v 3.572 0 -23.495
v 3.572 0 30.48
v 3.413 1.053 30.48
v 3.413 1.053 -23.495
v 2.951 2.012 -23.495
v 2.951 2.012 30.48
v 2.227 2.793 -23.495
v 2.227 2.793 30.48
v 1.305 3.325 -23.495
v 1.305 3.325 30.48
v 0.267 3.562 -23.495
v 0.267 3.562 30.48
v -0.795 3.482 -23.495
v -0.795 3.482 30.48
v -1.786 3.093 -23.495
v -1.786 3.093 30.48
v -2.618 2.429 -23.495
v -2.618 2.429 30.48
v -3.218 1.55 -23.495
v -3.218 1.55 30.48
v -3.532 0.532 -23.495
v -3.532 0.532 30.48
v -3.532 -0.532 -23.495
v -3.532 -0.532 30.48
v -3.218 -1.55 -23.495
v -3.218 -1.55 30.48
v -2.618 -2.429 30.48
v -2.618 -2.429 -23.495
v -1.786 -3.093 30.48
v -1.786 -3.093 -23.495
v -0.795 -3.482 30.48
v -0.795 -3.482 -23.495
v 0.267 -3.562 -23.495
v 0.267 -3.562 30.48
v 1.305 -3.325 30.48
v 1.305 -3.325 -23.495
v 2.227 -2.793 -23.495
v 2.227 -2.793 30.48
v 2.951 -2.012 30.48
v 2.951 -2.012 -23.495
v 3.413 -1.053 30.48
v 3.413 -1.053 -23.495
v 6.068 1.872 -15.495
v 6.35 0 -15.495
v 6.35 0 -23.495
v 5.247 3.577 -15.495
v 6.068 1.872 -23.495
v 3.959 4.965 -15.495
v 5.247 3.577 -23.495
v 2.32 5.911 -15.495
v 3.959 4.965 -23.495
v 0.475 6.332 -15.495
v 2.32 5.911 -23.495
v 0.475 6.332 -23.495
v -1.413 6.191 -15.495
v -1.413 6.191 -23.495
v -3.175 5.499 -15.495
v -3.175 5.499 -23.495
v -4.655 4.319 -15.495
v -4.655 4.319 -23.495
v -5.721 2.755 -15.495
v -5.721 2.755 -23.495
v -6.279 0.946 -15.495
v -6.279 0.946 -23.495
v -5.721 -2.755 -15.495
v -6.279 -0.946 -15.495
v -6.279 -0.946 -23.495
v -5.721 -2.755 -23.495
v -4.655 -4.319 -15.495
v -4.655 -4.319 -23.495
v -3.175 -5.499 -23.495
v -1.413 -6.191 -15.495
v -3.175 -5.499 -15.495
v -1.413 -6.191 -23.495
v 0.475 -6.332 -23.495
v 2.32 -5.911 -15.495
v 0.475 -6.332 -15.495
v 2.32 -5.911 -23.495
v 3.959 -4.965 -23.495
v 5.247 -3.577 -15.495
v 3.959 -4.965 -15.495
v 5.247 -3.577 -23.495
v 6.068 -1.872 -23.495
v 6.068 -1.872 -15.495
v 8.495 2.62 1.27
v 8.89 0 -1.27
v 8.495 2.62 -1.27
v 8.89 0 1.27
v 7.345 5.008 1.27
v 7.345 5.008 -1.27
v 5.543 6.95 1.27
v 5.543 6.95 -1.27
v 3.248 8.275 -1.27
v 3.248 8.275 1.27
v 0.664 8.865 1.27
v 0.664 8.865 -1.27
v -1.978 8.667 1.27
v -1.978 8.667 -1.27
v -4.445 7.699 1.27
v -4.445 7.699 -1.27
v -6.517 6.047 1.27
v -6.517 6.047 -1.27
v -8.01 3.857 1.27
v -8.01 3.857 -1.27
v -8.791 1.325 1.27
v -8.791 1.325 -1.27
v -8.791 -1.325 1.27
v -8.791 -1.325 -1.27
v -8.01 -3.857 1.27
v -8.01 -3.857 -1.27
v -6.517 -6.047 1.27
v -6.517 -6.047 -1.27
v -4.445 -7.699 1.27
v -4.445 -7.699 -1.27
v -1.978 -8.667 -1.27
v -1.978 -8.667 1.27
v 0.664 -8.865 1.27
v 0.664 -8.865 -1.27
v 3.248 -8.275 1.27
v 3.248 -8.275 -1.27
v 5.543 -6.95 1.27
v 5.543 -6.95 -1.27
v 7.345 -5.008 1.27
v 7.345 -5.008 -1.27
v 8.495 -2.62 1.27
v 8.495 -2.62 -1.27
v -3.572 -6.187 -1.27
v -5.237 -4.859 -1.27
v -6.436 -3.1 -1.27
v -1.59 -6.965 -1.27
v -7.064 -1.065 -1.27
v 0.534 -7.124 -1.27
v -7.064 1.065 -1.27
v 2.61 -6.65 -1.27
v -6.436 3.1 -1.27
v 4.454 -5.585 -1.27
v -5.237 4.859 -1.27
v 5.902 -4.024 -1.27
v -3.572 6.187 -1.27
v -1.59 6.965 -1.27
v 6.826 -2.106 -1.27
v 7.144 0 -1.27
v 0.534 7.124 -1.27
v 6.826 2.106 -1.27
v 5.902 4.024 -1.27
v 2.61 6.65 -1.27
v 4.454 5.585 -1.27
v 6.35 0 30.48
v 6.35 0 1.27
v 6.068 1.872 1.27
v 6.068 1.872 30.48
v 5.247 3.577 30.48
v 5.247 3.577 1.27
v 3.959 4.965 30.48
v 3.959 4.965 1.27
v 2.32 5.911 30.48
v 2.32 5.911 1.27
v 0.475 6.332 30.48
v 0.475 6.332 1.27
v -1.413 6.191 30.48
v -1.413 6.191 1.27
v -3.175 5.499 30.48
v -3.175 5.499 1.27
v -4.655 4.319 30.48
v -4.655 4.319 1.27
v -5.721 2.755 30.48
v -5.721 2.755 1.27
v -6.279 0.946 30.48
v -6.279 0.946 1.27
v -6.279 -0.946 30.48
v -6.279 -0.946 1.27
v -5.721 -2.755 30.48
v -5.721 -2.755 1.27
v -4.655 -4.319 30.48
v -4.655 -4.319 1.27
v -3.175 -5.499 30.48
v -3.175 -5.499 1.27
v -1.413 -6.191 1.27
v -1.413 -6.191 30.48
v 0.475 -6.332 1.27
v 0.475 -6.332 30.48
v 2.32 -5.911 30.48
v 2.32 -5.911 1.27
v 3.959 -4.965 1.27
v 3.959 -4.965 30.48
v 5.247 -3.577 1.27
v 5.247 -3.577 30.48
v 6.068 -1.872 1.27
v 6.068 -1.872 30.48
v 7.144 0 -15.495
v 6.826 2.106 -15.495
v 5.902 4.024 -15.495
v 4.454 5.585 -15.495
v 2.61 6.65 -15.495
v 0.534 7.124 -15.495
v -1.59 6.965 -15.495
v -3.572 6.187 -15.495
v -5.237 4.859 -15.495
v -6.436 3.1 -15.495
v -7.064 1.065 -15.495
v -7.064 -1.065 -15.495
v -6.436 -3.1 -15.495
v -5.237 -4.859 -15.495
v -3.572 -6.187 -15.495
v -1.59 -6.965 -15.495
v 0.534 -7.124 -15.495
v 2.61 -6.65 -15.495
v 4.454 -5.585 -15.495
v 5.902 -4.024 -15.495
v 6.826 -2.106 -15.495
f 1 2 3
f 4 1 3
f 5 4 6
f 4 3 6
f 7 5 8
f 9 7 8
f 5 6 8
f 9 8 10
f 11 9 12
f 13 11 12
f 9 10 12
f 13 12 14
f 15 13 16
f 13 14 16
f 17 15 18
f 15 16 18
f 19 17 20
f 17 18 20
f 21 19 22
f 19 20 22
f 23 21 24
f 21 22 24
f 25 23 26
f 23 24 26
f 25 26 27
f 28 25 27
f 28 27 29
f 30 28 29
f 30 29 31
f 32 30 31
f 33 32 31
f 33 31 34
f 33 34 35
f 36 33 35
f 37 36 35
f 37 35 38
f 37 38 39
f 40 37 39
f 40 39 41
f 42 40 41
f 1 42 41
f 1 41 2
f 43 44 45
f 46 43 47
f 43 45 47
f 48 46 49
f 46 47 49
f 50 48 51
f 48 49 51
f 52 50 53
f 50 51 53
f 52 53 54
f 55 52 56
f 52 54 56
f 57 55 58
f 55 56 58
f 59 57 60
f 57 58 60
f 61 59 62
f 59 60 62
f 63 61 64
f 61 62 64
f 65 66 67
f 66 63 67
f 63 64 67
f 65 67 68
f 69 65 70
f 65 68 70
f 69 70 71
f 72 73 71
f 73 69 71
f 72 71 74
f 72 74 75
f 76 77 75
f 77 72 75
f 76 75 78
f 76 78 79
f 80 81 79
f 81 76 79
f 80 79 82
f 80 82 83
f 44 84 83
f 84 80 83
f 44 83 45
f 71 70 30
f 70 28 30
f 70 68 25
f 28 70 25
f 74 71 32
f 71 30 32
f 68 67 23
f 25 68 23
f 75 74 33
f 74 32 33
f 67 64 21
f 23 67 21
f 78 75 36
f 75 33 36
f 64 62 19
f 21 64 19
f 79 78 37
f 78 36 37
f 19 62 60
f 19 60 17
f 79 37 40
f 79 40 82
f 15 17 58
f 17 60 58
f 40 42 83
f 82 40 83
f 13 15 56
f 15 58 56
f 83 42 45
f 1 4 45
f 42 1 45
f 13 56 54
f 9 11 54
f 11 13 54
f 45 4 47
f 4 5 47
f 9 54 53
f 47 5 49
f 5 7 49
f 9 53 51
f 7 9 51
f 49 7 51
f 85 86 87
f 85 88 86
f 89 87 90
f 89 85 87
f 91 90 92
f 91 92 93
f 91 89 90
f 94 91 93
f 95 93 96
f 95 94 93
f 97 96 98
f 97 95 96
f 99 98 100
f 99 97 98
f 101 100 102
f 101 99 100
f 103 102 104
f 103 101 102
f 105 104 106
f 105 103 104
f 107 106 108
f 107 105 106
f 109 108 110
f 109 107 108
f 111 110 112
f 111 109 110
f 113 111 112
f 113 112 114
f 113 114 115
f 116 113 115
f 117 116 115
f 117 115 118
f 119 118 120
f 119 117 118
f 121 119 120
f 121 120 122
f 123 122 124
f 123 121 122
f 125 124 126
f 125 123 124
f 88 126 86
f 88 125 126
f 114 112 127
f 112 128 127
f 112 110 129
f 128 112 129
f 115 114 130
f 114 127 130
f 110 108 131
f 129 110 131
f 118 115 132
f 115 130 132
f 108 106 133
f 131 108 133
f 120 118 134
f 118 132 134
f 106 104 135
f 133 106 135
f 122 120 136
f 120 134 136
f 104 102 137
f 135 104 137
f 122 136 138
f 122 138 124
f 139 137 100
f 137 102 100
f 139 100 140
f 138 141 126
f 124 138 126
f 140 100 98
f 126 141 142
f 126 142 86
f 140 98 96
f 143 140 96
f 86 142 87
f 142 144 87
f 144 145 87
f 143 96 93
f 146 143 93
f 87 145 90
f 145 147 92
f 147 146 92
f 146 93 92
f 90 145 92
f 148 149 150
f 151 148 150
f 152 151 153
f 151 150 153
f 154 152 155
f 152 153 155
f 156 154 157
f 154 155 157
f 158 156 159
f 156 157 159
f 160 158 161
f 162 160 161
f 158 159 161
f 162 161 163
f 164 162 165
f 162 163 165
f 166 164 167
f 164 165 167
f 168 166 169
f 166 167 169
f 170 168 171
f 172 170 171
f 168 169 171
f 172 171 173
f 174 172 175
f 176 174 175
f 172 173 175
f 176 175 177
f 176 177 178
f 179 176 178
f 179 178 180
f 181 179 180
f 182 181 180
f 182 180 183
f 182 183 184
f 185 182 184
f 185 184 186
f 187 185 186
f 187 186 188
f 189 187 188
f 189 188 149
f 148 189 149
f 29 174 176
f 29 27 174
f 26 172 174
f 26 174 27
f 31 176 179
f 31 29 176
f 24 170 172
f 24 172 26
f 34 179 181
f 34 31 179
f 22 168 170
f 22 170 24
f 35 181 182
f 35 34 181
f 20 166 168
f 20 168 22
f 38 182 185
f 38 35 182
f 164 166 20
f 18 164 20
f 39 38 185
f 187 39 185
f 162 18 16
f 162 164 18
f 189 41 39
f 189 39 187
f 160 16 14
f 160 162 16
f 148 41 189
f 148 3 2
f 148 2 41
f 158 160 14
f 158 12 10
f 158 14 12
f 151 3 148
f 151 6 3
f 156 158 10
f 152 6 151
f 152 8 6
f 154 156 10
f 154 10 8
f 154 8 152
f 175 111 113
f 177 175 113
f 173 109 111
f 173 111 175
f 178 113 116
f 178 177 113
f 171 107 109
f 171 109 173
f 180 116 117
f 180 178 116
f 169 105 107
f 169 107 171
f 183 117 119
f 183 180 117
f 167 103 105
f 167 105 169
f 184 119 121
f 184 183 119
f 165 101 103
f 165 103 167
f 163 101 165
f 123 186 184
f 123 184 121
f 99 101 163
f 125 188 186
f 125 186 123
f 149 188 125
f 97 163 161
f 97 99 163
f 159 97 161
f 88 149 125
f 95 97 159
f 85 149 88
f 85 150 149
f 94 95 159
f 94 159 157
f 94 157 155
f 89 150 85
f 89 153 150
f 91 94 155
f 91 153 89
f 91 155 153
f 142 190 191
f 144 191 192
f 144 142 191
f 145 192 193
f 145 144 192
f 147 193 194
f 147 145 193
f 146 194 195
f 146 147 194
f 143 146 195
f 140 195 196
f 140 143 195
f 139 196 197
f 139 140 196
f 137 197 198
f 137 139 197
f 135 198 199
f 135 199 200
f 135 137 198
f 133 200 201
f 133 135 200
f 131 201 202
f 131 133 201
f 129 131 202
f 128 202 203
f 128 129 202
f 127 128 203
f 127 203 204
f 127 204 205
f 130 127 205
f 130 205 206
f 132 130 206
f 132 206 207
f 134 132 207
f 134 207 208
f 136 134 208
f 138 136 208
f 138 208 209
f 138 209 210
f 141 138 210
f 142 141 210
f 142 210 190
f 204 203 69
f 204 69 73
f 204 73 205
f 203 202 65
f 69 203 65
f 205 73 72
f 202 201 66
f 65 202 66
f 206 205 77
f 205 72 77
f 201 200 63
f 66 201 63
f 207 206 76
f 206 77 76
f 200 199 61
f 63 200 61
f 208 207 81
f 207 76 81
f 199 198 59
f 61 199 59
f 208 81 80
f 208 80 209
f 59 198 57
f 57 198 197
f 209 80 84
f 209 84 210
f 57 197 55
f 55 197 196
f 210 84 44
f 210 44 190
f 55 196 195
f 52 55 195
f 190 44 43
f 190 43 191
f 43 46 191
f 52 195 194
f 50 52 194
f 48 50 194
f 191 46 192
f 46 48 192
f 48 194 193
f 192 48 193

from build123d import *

# Parameters (mm, degrees)
BOSS_EXTRUDE1_DEPTH      = 30.48
BOSS_EXTRUDE1_DEPTH_BACK = 23.495
SKETCH1_R                = 6.35
SKETCH2_R                = 8.89
BOSS_EXTRUDE2_DEPTH      = 1.27
SKETCH4_R                = 7.14375
BOSS_EXTRUDE3_DEPTH      = 15.495
SKETCH5_R                = 3.571875
CUT_EXTRUDE1_DEPTH       = 56.41989557


with BuildPart() as part:
    # Sketch1 → Boss-Extrude1 (new, two sides: drawn at the far end of the back side and taken through both)
    with BuildSketch(Plane.XY.offset(-BOSS_EXTRUDE1_DEPTH_BACK)):
        Circle(SKETCH1_R)
    extrude(amount=BOSS_EXTRUDE1_DEPTH + BOSS_EXTRUDE1_DEPTH_BACK)

    # Sketch2 → Boss-Extrude2 (add, symmetric)
    with BuildSketch(Plane.XY):
        Circle(SKETCH2_R)
    extrude(amount=BOSS_EXTRUDE2_DEPTH, both=True)

    # Sketch4 → Boss-Extrude3 (add)
    with BuildSketch(Plane.XY):
        Circle(SKETCH4_R)
    extrude(amount=-BOSS_EXTRUDE3_DEPTH)

    # Sketch5 → Cut-Extrude1 (cut, through all)
    with BuildSketch(Plane.XY.offset(30.48)):
        Circle(SKETCH5_R)
    extrude(amount=-CUT_EXTRUDE1_DEPTH, mode=Mode.SUBTRACT)


solid = part.part
